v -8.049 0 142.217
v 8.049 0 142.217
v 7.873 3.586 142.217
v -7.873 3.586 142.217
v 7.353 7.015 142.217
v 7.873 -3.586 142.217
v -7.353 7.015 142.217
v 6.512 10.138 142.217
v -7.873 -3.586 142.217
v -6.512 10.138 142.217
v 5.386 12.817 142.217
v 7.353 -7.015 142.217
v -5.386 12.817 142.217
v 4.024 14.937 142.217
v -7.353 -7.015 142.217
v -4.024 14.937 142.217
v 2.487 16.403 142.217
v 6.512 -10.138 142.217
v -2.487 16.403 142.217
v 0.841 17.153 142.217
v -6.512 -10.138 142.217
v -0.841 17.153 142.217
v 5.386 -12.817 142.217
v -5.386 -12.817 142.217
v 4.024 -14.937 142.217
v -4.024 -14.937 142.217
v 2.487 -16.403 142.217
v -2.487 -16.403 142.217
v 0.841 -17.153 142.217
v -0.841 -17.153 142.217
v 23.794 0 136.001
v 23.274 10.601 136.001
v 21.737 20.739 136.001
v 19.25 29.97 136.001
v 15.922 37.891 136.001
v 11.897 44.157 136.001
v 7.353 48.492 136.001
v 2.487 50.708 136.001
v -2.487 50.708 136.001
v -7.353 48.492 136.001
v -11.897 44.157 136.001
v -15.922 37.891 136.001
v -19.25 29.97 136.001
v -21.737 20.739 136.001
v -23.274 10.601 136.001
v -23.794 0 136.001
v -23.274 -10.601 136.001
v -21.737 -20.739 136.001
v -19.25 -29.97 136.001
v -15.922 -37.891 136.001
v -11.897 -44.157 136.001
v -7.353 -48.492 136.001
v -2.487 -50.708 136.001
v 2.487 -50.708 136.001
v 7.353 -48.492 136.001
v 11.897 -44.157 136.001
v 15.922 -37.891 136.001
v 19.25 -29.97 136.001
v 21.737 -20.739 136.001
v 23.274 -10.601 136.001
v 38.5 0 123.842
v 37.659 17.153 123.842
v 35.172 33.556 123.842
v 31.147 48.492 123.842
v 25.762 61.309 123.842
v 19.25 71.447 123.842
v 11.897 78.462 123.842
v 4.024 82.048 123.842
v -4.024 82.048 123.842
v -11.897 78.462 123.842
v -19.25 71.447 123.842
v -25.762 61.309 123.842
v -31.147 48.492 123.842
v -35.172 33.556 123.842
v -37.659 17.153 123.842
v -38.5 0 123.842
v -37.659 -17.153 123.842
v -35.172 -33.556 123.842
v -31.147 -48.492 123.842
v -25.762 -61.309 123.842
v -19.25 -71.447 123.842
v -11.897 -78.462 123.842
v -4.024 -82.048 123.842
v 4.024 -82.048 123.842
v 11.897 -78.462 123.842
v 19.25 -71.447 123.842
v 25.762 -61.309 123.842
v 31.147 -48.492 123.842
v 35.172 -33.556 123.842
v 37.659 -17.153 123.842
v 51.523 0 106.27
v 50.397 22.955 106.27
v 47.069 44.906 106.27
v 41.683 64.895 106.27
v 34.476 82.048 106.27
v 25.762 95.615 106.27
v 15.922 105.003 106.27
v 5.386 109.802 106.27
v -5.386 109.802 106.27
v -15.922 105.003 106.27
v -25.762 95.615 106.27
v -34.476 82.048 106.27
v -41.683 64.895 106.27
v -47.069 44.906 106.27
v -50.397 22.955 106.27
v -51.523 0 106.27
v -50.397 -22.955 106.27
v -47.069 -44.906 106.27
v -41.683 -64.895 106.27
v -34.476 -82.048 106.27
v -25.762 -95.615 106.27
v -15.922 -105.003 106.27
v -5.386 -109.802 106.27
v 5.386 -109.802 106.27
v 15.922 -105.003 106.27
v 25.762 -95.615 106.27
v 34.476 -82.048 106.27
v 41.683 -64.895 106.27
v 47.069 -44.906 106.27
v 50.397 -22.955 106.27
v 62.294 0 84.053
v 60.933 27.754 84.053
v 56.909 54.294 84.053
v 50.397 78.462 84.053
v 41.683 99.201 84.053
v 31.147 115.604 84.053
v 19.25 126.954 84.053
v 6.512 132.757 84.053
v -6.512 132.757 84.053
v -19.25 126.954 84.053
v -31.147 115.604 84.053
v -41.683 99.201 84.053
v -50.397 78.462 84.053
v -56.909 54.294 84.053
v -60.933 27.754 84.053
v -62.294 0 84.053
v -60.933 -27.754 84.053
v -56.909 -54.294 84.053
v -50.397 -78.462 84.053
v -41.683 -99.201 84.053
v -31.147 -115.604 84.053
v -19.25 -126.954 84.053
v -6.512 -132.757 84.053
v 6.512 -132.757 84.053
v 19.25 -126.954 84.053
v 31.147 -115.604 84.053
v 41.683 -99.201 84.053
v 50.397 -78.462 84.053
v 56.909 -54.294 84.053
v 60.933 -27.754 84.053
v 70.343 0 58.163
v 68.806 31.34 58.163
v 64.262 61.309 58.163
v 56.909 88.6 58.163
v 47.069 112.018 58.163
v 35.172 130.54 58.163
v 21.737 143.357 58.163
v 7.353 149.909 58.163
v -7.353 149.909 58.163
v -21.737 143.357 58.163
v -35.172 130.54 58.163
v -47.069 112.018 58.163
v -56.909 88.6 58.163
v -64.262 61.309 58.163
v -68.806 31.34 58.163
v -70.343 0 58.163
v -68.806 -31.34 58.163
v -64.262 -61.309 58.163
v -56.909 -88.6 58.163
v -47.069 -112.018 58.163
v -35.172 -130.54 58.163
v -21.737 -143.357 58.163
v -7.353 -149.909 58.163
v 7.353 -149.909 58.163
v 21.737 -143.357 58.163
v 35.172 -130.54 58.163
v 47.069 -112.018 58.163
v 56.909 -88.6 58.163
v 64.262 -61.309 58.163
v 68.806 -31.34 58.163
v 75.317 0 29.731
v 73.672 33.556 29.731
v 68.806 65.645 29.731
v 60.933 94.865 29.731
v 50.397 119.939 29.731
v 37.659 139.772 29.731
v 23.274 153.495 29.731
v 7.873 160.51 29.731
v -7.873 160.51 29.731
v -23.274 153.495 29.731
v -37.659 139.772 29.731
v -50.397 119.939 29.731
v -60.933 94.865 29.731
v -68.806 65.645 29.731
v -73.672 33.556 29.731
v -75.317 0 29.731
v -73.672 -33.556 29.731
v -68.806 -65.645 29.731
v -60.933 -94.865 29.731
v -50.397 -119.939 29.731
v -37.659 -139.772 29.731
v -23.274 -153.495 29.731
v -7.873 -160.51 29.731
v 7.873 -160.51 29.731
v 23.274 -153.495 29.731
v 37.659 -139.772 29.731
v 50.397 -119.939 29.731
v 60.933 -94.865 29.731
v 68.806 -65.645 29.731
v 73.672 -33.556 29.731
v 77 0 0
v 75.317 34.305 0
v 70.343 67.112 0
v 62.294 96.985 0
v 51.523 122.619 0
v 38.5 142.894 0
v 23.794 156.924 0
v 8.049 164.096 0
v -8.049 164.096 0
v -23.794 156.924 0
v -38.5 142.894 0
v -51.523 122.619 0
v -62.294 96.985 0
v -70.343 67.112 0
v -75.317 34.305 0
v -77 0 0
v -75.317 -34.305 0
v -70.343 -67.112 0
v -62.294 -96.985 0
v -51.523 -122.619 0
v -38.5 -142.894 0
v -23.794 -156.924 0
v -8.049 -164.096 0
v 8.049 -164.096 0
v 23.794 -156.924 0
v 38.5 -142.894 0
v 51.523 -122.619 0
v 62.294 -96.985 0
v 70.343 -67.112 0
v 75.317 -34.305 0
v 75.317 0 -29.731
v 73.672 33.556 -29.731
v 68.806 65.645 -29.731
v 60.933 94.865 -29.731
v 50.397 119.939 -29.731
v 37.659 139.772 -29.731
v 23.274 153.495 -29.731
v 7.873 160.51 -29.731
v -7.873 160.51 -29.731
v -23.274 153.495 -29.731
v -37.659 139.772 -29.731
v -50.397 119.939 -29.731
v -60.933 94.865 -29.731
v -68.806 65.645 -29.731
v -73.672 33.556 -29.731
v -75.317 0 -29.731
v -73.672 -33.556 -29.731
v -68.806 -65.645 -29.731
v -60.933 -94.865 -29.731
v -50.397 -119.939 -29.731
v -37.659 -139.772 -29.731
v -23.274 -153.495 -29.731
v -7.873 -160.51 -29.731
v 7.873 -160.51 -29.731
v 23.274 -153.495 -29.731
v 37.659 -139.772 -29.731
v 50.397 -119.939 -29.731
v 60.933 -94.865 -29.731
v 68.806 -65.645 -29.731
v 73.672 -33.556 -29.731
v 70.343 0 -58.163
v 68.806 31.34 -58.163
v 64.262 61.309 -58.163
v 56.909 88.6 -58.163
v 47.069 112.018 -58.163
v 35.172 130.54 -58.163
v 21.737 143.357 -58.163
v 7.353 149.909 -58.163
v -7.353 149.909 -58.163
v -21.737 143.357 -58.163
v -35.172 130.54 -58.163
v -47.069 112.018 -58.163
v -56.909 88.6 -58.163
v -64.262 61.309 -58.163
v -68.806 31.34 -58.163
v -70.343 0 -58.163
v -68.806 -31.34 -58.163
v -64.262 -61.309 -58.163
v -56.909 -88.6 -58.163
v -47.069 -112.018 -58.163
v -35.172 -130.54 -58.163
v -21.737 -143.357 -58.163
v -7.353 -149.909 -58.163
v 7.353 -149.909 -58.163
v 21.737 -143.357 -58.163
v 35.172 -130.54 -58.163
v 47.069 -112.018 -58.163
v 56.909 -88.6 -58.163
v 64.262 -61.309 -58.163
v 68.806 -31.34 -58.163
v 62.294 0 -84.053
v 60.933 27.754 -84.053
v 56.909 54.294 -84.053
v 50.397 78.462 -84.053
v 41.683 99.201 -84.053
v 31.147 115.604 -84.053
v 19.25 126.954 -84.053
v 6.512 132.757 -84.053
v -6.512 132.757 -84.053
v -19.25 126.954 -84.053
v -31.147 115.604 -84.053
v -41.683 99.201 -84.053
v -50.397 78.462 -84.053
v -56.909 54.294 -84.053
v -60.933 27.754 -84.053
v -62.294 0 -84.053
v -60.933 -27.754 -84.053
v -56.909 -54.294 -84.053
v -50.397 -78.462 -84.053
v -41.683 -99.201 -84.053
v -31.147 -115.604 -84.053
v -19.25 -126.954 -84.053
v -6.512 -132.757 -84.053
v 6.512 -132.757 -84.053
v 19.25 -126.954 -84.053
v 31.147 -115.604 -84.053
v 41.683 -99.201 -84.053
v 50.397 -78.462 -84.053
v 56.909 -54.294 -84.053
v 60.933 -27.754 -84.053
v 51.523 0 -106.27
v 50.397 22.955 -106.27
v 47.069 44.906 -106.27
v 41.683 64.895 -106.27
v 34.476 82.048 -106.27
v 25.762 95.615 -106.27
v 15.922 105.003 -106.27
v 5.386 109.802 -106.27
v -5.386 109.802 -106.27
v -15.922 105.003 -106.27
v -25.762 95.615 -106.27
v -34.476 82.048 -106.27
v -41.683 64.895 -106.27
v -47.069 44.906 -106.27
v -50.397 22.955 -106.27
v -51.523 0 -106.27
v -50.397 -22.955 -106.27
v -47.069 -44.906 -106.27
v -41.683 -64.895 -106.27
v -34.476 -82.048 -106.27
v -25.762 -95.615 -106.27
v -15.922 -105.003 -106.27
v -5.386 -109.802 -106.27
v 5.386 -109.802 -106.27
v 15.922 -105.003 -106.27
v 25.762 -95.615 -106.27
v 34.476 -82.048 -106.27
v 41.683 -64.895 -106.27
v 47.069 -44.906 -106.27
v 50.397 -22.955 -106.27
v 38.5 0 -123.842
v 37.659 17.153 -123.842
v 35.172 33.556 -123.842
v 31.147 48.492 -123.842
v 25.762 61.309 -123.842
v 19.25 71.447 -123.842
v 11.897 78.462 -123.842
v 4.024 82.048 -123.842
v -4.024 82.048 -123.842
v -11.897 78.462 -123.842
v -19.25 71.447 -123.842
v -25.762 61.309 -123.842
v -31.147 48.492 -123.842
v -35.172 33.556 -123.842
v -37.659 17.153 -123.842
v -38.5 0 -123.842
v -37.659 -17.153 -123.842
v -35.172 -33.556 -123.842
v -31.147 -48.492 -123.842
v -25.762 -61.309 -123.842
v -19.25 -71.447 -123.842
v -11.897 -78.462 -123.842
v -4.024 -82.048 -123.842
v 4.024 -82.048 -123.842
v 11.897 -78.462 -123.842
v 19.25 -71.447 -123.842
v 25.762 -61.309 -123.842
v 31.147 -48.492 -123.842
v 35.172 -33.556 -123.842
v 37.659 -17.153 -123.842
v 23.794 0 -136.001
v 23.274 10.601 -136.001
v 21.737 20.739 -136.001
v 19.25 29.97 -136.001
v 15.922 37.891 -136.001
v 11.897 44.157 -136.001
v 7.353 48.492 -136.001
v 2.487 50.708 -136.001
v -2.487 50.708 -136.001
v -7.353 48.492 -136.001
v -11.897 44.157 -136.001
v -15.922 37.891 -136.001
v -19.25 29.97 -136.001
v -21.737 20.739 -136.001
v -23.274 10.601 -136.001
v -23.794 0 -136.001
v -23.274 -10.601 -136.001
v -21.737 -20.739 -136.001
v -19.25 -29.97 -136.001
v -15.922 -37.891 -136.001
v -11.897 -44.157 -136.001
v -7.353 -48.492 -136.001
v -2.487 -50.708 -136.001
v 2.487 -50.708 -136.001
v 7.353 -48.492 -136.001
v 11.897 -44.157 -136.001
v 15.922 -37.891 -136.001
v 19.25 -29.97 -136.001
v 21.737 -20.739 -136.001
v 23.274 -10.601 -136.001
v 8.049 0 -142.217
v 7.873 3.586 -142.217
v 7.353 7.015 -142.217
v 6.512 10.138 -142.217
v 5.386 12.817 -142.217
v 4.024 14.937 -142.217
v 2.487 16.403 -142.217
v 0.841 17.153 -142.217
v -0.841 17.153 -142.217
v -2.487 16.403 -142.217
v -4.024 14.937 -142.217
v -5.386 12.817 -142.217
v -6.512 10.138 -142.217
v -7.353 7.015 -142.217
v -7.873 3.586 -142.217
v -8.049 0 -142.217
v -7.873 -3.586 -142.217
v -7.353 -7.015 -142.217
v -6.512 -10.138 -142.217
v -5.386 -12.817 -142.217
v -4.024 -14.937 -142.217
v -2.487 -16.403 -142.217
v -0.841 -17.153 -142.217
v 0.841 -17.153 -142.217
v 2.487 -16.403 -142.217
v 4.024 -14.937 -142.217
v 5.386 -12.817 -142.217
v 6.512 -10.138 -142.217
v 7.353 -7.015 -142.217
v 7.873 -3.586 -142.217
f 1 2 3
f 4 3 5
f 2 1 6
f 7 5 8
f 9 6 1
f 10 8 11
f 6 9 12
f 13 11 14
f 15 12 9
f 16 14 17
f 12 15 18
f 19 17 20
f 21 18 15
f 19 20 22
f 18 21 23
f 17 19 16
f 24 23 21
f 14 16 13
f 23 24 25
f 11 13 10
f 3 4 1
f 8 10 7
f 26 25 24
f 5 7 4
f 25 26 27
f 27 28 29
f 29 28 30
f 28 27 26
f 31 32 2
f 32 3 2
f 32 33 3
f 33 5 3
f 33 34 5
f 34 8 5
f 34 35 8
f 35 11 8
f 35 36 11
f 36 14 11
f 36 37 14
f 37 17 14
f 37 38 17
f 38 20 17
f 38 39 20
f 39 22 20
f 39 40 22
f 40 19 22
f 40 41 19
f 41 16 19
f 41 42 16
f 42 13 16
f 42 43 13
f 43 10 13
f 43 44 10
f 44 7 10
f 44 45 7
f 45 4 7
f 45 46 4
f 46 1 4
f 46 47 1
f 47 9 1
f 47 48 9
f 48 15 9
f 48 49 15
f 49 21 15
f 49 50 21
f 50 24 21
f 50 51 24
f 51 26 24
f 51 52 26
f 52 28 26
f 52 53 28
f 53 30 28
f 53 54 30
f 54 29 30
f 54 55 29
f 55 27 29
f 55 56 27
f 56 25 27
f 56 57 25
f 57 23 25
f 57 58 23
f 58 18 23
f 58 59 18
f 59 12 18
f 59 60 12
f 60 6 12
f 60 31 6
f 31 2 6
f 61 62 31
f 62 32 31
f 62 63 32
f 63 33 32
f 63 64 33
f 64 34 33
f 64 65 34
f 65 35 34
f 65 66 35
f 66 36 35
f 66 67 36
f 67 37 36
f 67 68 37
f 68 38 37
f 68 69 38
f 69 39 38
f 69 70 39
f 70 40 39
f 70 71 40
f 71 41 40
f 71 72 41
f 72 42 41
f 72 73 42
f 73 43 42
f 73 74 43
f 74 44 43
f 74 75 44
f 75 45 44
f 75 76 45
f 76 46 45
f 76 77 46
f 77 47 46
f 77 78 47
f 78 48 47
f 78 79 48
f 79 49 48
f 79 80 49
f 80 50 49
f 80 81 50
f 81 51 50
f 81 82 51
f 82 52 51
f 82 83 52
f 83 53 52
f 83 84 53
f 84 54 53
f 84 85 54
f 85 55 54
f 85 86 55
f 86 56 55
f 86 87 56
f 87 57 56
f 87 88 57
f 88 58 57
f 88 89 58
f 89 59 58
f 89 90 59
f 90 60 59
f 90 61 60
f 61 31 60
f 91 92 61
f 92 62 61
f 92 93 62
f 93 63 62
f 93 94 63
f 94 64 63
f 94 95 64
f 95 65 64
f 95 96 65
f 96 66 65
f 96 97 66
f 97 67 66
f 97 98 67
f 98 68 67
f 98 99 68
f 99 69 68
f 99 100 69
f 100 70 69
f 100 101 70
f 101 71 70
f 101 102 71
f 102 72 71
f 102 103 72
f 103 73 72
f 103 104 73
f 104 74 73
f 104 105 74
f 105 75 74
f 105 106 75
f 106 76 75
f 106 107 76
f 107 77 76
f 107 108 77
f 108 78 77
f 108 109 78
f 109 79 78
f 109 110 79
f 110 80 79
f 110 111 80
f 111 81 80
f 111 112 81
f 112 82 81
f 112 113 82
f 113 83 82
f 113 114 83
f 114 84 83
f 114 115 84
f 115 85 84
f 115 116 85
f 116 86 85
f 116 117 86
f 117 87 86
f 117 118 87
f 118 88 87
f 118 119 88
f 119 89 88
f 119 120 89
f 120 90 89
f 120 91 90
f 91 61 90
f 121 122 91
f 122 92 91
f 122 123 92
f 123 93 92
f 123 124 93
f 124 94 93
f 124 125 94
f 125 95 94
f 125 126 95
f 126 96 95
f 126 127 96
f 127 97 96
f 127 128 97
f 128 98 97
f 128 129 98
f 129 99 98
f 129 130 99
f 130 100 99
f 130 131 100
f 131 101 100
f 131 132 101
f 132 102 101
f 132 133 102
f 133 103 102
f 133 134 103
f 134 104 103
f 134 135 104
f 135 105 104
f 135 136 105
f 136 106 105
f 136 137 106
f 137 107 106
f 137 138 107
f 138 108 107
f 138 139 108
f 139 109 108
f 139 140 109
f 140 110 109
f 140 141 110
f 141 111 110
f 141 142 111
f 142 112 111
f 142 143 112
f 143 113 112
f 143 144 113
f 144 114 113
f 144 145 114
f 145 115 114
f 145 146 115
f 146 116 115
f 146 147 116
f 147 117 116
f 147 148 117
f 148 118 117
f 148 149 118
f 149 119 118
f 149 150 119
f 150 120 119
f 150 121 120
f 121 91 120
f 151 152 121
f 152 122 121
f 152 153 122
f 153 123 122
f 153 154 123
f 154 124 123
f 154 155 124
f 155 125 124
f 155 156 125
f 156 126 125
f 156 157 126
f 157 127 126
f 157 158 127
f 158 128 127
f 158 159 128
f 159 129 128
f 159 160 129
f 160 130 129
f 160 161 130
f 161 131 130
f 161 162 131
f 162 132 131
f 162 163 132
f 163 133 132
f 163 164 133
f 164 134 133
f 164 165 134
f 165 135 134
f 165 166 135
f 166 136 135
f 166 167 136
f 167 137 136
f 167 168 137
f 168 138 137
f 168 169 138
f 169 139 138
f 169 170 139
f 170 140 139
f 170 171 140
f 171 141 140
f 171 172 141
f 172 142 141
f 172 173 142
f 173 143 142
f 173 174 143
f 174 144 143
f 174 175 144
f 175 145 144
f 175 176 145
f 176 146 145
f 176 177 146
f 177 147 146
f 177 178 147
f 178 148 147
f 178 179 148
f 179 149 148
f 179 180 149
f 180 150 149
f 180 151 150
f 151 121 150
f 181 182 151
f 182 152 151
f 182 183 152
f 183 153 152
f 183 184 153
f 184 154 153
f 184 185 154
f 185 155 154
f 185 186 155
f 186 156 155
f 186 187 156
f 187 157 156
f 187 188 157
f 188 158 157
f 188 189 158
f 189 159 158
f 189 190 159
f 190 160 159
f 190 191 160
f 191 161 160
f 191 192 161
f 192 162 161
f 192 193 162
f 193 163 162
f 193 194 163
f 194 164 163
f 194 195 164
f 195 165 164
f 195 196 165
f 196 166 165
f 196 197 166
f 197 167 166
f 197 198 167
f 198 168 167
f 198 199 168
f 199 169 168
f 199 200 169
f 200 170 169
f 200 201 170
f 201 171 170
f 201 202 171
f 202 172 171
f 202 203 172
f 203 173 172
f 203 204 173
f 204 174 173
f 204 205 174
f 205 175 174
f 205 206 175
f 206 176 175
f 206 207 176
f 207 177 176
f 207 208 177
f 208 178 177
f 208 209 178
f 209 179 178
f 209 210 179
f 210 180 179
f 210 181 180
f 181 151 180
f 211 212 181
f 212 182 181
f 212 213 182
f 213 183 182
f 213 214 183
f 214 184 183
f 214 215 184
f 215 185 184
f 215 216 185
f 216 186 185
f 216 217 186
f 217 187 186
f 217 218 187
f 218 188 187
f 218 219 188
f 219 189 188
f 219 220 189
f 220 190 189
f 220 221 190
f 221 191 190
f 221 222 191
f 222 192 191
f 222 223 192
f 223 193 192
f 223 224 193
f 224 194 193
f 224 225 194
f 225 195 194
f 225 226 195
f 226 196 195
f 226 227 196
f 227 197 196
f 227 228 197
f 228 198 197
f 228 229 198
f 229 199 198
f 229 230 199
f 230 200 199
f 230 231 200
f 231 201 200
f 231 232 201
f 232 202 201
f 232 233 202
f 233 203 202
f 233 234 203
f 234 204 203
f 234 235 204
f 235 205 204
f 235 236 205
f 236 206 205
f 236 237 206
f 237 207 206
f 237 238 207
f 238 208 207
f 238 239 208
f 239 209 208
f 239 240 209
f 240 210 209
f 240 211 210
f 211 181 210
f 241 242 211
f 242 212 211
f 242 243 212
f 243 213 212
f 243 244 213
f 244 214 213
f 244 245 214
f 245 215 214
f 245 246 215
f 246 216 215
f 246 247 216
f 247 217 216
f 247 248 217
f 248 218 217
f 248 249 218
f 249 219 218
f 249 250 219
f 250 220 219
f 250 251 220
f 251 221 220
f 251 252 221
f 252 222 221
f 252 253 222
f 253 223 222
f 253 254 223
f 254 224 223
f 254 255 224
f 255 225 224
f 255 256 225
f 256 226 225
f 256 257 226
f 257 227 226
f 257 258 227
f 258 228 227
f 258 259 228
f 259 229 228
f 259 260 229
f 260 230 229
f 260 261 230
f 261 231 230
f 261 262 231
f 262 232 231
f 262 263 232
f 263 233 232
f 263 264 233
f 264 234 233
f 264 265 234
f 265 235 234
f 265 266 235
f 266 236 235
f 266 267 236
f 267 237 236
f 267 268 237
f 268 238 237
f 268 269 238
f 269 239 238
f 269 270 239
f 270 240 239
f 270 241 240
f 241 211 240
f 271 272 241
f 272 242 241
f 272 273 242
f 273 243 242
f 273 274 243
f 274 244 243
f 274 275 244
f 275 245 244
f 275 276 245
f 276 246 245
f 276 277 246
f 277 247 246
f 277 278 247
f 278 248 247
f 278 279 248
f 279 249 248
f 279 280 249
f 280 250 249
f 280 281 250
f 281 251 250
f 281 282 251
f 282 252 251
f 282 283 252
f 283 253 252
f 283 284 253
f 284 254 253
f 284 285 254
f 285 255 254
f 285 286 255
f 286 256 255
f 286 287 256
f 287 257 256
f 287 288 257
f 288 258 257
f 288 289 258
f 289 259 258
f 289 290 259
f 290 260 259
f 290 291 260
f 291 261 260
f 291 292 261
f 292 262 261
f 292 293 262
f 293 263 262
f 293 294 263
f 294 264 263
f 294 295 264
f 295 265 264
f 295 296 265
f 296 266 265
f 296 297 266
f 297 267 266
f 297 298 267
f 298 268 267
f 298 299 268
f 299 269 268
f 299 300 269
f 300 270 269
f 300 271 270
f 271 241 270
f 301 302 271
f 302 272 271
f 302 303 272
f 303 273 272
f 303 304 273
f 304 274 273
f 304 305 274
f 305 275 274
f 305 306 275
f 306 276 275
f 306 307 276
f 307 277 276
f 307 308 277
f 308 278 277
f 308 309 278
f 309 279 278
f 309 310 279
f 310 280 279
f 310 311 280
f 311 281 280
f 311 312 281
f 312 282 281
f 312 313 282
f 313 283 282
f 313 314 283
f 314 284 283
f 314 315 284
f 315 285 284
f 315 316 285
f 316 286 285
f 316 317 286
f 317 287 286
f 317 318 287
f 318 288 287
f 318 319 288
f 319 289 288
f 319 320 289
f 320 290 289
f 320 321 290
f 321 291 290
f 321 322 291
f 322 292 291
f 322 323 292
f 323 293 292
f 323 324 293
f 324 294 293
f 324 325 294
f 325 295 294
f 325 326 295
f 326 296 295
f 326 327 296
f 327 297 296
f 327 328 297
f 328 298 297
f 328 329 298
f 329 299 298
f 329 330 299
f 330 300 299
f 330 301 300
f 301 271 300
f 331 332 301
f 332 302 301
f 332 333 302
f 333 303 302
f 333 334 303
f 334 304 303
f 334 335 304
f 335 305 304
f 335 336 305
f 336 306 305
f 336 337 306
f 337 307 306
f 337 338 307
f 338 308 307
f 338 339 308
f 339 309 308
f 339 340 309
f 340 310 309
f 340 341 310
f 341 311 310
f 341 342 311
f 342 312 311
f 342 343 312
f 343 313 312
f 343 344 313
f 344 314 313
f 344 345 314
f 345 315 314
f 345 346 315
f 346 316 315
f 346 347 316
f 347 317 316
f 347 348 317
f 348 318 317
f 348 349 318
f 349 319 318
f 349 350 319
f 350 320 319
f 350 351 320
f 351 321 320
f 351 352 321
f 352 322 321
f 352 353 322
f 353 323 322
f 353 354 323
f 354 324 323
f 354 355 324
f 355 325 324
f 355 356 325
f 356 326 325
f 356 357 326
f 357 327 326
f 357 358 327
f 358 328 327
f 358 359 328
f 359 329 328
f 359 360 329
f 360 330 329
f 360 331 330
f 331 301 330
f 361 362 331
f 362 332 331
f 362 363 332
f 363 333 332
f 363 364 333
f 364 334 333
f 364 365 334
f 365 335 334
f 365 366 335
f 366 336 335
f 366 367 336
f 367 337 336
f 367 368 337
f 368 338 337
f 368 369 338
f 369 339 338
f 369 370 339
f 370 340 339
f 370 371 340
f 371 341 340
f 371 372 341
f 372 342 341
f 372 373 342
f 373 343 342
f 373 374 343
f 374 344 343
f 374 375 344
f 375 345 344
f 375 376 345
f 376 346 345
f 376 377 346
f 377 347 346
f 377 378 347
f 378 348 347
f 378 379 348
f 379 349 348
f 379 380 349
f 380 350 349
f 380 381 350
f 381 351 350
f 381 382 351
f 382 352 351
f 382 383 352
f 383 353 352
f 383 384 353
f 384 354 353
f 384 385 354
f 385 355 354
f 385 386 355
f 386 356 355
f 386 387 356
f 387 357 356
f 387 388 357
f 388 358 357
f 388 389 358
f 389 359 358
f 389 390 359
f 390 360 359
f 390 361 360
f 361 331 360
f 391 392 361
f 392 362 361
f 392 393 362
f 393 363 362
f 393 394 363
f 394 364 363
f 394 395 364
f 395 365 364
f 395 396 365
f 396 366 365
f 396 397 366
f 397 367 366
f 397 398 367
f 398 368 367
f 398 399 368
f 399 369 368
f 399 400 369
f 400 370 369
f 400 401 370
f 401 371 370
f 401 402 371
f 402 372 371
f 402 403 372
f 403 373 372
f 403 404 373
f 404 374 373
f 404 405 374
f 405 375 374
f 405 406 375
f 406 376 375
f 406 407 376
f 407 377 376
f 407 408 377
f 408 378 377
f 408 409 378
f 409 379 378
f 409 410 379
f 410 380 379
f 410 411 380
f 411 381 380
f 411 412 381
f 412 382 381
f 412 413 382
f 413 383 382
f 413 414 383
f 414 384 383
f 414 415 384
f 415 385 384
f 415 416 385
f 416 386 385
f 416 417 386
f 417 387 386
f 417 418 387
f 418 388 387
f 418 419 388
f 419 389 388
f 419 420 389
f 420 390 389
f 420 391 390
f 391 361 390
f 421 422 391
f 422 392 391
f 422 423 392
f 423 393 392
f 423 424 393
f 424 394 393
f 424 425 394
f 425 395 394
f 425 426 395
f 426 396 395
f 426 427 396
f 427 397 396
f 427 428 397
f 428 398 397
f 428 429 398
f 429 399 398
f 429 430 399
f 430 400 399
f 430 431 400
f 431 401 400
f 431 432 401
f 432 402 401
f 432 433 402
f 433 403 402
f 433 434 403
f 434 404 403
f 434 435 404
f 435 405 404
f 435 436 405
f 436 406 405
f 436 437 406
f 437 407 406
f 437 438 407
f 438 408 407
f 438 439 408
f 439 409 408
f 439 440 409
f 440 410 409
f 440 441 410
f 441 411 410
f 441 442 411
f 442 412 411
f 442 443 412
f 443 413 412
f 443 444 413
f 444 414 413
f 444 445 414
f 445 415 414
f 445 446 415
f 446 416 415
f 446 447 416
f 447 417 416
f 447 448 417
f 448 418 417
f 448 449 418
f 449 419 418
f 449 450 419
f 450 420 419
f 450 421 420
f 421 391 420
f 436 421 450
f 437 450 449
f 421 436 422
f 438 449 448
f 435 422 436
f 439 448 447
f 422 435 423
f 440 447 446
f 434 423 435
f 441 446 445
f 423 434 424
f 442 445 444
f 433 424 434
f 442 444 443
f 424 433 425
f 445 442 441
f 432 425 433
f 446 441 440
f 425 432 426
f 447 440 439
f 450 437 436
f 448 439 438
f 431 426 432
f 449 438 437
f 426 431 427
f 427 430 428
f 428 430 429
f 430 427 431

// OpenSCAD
// Generated by SolidPython 1.0.1 on 2020-07-29 00:46:48


scale(v = [7, 15, 13]) {
	sphere(r = 11);
}
/***********************************************
*********      SolidPython code:      **********
************************************************
 
# import packages: SolidPython
from solid import *
from solid.utils import *
from itertools import chain, combinations, permutations


class Resize:

    def __init__(self, scad_file):
        self.scad_file = scad_file
        #self.scad_file = import_scad(scad_file)
        # cone/cylinder param:
        self.r1 = 0
        self.r2 = 0
        self.h = 0
        # rectangular prism param:
        self.w = 0
        self.l = 0
        # ellipse param:
        self.r = 0

    # import OpenScad code (file name corresponds to shape)


    # classify shape + parameters
    def assign(self, param1, param2, param3):
        if self.scad_file == 'cone.scad':
            self.r1 = param1
            self.r2 = param2
            self.h = param3
        elif self.scad_file == 'cylinder.scad':
            self.r1 = param1
            self.r2 = param2
            self.h = param3
        elif self.scad_file == 'rectangularPrism.scad':
            self.h = param1
            self.l = param2
            self.w = param3
        else:
            self.r = param1
            self.h = param2

    # resize parameters
    def iterate(self):
        x = range(3, 20, 2)
        i = 1
        if self.scad_file == 'cone.scad':
            tempList = list(permutations(x, 2))
            for temp in tempList:
                param1 = temp[0]
                param2 = temp[1]
                filepath = 'produced_scad_files/' + 'cone' + str(param1) + '_' + str(param2) + '_' + '.scad'
                scad_render_to_file(cylinder(h=param1, r1=param2, r2=0), filepath)

        elif self.scad_file == 'cylinder.scad':
            tempList = list(permutations(x, 3))
            for temp in tempList:
                param1 = temp[0]
                param2 = temp[1]
                filepath = 'produced_scad_files/' + 'cylinder' + str(param1) + '_' + str(param2) + '_' + '.scad'
                scad_render_to_file(cylinder(h=param1, r1=param2, r2=param2), filepath)

        elif self.scad_file == 'rectangularPrism.scad':
            tempList = list(permutations(x, 3))
            for temp in tempList:
                param1 = temp[0]
                param2 = temp[1]
                param3 = temp[2]
                filepath = 'produced_scad_files/' + 'rectangularPrism' + str(param1) + '_' + str(param2) + '_' + str(
                    param3) + '.scad'
                scad_render_to_file(cube(size=(param1, param2, param3)), filepath)

        elif self.scad_file == 'ellipse.scad':
            tempList = list(permutations(x, 4))
            for temp in tempList:
                param1 = temp[0]
                param2 = temp[1]
                param3 = temp[2]
                param4 = temp[3]
                filepath = 'produced_scad_files/' + 'ellipse' + str(param1) + '_' + str(param2) + '_' + str(param3) + '_' + str(param4) + '.scad'
                scad_render_to_file(scale([param1, param2, param3])(sphere(r=param4)), filepath)

    def render_to_scadfile(self):
        scad_render_to_file(scad, 'example.scad') 
 
************************************************/
